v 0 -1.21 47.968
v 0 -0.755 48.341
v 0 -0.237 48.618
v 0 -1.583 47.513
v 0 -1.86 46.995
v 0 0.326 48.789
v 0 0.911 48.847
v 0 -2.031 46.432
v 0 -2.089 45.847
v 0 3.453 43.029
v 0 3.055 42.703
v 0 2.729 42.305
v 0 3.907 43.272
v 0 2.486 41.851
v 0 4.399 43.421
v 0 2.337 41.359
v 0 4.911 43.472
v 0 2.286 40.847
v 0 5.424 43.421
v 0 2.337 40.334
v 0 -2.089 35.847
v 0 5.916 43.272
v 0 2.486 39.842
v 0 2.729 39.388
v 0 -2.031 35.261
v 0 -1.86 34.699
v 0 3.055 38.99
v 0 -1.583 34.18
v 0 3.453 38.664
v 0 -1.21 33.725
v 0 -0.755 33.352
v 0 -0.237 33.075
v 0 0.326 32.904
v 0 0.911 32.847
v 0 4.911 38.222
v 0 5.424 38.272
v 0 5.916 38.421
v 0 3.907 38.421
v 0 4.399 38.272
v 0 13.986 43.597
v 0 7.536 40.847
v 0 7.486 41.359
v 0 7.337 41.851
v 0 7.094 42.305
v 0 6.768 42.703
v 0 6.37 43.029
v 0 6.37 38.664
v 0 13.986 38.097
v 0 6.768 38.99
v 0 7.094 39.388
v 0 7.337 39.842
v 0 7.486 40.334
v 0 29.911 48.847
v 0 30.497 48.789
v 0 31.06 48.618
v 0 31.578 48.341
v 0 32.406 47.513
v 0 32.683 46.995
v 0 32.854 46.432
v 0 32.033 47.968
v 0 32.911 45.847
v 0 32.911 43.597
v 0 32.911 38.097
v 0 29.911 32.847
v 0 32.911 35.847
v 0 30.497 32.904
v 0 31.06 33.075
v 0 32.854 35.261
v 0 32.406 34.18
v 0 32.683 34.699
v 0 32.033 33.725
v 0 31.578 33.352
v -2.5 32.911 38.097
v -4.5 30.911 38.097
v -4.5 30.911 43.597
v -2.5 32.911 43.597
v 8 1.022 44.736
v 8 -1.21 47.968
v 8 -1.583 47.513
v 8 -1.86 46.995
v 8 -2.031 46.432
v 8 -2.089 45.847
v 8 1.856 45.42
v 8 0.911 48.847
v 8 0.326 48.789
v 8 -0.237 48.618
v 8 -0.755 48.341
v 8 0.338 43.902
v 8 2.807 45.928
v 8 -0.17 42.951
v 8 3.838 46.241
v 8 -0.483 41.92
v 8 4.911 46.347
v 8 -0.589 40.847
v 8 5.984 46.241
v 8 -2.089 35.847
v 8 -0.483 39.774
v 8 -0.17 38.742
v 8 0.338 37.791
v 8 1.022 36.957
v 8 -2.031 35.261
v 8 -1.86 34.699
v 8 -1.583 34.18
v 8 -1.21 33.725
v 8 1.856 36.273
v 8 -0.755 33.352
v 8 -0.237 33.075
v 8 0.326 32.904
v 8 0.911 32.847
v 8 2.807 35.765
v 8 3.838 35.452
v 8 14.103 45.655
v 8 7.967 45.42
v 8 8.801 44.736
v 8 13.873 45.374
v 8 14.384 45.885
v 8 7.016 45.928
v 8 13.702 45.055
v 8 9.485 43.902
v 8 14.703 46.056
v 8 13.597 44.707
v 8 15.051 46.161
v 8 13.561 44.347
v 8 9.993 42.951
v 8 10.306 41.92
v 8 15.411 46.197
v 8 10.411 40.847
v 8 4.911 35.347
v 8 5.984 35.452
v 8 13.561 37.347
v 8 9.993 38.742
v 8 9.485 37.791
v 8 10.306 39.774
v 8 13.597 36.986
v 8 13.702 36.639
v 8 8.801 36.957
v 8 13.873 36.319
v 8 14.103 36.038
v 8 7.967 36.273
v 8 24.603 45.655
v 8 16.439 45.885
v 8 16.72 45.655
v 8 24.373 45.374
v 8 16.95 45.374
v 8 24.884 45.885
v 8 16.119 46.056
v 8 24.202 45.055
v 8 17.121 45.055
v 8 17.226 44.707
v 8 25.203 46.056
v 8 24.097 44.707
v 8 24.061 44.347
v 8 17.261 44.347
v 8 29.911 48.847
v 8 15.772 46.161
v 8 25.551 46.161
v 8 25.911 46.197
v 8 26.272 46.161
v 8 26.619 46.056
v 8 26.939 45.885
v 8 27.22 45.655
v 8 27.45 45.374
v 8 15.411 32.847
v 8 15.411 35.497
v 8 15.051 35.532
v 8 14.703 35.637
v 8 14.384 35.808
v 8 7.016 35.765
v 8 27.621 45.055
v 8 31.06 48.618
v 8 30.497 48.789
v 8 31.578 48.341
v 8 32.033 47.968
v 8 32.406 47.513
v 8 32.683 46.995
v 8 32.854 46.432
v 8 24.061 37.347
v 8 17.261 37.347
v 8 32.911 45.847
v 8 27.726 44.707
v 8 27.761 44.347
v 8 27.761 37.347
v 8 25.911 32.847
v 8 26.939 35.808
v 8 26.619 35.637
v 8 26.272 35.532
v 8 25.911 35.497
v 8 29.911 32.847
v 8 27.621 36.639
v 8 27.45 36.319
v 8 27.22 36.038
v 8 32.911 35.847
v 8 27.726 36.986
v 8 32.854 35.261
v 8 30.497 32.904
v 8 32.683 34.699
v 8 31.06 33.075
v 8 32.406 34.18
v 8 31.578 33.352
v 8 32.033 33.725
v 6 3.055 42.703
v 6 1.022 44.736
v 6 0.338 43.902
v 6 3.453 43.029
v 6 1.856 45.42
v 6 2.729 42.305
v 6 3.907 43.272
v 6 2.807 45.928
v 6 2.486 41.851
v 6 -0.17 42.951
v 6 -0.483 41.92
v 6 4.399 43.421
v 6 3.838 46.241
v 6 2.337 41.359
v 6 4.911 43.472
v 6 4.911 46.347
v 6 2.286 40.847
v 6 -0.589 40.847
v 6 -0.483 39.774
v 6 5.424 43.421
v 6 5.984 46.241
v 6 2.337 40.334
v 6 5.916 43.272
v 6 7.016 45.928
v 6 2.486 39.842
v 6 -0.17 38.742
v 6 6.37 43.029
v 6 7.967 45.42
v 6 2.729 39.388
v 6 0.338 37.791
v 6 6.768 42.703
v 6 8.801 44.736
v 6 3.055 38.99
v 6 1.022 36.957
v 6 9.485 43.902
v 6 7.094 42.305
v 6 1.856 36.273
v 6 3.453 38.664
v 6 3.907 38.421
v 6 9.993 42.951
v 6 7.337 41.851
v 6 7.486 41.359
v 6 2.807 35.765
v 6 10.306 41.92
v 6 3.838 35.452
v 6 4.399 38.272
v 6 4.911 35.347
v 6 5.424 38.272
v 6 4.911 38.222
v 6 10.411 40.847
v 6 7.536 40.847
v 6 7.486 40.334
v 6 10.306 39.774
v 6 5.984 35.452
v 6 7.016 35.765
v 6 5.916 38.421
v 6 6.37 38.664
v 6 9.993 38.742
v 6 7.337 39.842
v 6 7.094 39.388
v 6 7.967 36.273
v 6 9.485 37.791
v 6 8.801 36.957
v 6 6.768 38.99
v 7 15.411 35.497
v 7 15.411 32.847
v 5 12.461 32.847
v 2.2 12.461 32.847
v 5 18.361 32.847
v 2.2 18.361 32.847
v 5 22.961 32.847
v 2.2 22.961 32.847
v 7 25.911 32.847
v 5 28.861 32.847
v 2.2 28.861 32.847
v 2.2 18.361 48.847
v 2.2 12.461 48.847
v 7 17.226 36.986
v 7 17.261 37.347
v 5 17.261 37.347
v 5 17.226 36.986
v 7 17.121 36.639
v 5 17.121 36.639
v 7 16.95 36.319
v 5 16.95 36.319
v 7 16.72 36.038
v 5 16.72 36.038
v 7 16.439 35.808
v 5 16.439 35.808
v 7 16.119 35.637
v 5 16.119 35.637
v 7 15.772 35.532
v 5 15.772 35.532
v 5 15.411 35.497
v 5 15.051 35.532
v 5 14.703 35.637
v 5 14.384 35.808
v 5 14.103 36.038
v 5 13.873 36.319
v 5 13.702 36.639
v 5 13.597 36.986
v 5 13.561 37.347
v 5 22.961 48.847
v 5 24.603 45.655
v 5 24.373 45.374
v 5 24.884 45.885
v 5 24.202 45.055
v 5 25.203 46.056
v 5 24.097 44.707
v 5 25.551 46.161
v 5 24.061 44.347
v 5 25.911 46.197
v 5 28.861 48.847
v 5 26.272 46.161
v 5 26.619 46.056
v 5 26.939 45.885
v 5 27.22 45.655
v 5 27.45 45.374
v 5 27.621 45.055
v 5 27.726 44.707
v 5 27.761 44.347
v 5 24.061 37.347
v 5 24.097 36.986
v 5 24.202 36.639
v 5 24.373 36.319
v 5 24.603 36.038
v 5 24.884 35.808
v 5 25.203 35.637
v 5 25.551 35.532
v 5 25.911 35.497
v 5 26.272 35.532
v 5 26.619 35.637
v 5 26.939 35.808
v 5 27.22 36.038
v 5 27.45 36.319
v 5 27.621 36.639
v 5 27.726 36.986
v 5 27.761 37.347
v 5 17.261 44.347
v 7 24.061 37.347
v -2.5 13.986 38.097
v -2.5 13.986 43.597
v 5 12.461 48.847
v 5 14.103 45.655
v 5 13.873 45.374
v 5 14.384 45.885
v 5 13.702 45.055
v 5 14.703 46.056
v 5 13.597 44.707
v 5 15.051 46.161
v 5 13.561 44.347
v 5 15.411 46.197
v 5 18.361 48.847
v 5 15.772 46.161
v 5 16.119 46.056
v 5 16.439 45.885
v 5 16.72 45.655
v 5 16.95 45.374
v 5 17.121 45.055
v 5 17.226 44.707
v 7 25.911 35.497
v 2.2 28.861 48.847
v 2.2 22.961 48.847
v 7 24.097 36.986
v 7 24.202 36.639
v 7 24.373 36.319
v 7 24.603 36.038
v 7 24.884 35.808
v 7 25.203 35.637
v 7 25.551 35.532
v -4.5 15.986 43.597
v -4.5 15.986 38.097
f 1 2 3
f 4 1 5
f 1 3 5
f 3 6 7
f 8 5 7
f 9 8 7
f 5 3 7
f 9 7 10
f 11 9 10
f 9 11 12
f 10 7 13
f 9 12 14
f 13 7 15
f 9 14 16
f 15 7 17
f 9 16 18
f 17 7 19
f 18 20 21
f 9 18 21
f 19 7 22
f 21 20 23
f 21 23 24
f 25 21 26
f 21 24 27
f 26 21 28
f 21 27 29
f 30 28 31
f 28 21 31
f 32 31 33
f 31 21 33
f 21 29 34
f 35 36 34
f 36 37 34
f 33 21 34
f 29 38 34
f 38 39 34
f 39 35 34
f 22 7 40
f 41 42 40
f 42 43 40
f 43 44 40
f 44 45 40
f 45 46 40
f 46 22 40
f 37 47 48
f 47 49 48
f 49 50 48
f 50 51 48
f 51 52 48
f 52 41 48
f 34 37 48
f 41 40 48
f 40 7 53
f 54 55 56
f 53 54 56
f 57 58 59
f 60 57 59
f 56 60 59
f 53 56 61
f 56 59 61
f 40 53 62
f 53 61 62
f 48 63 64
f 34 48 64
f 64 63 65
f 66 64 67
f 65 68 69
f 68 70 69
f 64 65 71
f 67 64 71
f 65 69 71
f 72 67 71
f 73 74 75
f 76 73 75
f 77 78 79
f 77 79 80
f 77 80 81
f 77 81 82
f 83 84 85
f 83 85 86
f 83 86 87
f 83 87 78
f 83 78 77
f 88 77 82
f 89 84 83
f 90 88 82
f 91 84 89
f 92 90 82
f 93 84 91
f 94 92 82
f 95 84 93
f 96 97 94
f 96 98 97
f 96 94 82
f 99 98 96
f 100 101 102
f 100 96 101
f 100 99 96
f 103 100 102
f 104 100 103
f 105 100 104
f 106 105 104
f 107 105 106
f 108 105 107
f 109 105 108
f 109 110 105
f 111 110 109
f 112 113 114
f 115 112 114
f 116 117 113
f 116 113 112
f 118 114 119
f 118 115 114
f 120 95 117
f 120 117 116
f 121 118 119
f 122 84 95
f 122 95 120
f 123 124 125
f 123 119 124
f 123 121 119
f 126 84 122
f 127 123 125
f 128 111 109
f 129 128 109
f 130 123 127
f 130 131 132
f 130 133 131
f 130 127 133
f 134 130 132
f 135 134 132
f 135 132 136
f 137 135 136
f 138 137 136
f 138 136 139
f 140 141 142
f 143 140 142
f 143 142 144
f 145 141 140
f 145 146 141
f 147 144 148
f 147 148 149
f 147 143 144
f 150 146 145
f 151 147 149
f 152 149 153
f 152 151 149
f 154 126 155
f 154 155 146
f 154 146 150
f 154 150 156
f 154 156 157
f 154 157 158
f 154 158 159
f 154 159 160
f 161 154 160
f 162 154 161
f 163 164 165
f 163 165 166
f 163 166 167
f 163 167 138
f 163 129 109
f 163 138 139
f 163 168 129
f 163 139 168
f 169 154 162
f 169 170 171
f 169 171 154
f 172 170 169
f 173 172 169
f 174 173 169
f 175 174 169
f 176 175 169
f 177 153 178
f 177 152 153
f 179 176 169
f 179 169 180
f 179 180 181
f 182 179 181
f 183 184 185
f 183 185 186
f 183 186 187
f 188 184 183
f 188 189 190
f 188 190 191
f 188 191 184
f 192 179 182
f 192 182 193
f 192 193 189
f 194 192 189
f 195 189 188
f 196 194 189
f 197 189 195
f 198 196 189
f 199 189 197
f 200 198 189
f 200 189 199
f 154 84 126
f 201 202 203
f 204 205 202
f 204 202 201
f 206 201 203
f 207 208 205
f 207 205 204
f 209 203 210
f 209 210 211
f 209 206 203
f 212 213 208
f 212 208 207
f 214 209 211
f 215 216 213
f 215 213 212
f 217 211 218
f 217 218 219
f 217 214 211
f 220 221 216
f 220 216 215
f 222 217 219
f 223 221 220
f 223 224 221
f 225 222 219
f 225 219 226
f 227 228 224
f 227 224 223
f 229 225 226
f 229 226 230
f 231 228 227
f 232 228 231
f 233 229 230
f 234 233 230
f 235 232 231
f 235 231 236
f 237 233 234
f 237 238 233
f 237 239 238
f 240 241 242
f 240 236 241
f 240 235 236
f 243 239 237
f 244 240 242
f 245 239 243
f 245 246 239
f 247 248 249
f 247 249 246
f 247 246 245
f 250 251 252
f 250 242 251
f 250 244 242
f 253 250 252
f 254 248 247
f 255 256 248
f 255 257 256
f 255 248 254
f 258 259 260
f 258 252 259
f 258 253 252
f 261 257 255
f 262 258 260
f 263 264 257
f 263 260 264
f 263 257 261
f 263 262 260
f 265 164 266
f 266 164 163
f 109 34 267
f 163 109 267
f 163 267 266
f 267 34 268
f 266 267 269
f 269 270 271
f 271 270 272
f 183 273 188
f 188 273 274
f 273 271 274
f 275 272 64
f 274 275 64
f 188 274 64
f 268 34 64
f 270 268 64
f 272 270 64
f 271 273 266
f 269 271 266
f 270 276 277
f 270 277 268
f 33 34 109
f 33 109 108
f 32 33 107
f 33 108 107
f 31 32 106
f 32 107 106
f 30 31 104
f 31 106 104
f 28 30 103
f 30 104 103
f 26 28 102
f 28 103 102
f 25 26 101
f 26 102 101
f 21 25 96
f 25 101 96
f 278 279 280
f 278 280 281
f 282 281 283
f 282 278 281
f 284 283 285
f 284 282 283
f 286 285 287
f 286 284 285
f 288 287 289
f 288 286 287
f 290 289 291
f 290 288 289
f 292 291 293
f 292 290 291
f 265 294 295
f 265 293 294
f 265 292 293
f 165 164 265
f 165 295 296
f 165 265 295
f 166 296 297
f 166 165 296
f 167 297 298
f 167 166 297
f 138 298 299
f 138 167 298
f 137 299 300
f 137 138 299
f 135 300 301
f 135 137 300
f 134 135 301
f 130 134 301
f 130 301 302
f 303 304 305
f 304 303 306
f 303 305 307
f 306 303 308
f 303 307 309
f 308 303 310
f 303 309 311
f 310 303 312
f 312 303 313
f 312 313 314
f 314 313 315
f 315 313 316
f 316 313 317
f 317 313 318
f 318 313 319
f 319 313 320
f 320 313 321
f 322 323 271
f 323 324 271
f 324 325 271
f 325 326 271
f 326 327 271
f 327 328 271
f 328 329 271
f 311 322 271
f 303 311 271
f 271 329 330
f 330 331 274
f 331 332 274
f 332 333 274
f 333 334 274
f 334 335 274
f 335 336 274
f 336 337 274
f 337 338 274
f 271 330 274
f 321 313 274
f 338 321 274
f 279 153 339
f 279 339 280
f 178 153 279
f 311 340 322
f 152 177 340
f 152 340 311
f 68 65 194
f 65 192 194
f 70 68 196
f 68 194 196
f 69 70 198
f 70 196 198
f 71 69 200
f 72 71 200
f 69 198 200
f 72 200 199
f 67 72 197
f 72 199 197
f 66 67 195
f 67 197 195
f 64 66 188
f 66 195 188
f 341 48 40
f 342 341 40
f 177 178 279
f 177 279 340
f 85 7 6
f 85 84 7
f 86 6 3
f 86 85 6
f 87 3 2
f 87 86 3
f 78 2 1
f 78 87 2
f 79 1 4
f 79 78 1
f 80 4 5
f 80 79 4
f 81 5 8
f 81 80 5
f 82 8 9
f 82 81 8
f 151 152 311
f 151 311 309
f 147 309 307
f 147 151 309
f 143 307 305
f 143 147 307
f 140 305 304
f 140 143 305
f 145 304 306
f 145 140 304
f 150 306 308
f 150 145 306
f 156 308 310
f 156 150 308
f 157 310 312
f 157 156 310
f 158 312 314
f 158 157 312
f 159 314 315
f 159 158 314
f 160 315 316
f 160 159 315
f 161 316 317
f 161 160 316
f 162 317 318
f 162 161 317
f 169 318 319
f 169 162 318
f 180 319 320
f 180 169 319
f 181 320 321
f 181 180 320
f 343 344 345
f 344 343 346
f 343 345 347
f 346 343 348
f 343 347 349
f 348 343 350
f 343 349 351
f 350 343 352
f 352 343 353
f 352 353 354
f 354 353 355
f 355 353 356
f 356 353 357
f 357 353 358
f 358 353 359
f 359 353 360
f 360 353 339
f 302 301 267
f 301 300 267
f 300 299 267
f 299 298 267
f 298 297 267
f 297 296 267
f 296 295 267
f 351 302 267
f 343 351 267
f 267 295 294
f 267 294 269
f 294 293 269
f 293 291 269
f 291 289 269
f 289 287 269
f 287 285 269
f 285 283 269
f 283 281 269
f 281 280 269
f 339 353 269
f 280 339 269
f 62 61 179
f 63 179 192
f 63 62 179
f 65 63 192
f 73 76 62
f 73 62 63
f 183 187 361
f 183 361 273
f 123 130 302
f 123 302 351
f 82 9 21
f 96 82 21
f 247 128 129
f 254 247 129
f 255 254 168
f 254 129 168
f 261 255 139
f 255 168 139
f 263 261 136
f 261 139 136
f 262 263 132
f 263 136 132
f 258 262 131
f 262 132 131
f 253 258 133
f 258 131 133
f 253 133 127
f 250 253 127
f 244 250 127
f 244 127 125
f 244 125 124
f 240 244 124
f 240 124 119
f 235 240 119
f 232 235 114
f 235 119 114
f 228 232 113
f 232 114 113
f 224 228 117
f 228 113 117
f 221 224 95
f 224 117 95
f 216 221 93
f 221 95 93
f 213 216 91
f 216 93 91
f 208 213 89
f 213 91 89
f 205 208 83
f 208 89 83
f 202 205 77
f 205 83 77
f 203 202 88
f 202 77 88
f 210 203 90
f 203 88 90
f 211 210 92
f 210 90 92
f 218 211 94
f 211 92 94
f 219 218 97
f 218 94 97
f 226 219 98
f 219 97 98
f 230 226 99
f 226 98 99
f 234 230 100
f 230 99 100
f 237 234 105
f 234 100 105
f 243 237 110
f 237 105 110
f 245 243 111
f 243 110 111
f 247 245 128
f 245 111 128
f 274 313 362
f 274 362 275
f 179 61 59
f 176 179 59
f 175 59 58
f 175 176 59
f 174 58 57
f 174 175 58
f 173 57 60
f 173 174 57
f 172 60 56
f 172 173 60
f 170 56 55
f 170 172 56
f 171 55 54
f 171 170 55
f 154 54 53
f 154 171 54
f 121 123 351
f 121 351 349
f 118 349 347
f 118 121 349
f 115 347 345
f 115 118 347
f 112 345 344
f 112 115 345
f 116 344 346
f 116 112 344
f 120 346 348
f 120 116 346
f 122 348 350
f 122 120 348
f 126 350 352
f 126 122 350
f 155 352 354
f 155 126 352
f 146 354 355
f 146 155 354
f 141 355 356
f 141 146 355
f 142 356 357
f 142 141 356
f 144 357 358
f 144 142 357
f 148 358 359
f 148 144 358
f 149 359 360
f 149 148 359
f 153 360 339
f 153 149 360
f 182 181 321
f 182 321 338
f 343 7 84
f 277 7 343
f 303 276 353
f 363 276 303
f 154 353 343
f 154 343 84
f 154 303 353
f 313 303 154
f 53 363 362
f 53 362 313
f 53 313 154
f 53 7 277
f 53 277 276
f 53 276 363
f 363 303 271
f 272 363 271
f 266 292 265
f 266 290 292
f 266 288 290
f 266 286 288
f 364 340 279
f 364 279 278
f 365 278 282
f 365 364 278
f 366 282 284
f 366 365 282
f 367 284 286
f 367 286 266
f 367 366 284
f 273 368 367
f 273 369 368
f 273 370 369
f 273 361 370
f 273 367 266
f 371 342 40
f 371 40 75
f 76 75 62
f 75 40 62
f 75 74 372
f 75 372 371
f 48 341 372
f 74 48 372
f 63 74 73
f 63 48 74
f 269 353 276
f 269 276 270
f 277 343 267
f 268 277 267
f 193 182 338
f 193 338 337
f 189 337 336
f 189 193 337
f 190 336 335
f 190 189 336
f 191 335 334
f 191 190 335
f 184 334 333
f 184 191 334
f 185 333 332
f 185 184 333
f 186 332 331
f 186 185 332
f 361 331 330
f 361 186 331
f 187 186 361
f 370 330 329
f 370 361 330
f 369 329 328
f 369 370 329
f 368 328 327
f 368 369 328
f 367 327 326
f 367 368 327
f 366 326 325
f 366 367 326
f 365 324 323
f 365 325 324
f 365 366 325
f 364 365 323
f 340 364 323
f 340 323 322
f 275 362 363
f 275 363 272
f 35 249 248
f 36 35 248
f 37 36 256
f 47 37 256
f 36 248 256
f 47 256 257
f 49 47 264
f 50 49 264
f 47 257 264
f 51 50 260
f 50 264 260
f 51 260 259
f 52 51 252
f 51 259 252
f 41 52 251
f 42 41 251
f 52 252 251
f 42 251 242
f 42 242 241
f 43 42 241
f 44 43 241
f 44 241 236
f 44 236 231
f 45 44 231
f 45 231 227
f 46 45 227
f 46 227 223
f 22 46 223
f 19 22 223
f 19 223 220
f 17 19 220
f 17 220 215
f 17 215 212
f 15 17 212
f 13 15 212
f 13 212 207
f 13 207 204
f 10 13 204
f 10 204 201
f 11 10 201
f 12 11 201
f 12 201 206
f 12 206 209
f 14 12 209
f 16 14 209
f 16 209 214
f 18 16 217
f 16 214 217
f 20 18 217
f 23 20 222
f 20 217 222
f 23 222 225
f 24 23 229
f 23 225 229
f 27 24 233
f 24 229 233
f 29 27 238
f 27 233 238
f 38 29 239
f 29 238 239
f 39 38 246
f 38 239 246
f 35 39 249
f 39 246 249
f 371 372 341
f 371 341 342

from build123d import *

# Parameters (mm, degrees)
SKETCH1_W           = 16
SKETCH1_H           = 35
BOSS_EXTRUDE1_DEPTH = 8
SKETCH2_W           = 5.5
SKETCH2_H           = 18.925407089
BOSS_EXTRUDE2_DEPTH = 4.5
CHAMFER1_SIZE       = 2
CUT_EXTRUDE1_START  = -3
SKETCH7_W           = 16
SKETCH7_H           = 5.9
CUT_EXTRUDE1_DEPTH  = 2.8
CUT_EXTRUDE2_DEPTH  = 5
SKETCH9_W           = 4.5
SKETCH9_H           = 10.5
CUT_EXTRUDE3_DEPTH  = 1
FILLET7_R           = 3
SKETCH10_R          = 2.625
CUT_EXTRUDE4_DEPTH  = 20
SKETCH11_R          = 5.5
CUT_EXTRUDE5_DEPTH  = 2


with BuildPart() as part:
    # Sketch1 → Boss-Extrude1 (new body)
    with BuildSketch(Plane(origin=(0, 0, 0), x_dir=(0, 0, -1), z_dir=(1, 0, 0))):
        with Locations((-40.846556001, 15.41146402)):
            Rectangle(SKETCH1_W, SKETCH1_H)
    extrude(amount=BOSS_EXTRUDE1_DEPTH)

    # Sketch2 → Boss-Extrude2 (add)
    with BuildSketch(Plane.ZY):
        with Locations((40.846556001, 23.448760476)):
            Rectangle(SKETCH2_W, SKETCH2_H)
    extrude(amount=BOSS_EXTRUDE2_DEPTH)

    # Chamfer1
    chamfer1_edges = [part.edges().sort_by_distance(p)[0] for p in [
        (-4.5, 13.986056931, 40.846556001),
        (-4.5, 32.91146402, 40.846556001),
    ]]
    chamfer(chamfer1_edges, length=CHAMFER1_SIZE)

    # Sketch7 → Cut-Extrude1 (cut)
    with BuildSketch(Plane(origin=(8, 0, 0), x_dir=(0, 0, -1), z_dir=(1, 0, 0)).offset(CUT_EXTRUDE1_START)):
        with Locations((-40.846556001, 25.91146402)):
            Rectangle(SKETCH7_W, SKETCH7_H)
        with Locations((-40.846556001, 15.41146402)):
            Rectangle(SKETCH7_W, SKETCH7_H)
    extrude(amount=-CUT_EXTRUDE1_DEPTH, mode=Mode.SUBTRACT)

    # Sketch8 → Cut-Extrude2 (cut)
    with BuildSketch(Plane(origin=(8, 0, 0), x_dir=(0, 0, -1), z_dir=(1, 0, 0))):
        with BuildLine():
            Line((-44.346556001, 27.76146402), (-37.346556001, 27.76146402))
            ThreePointArc((-37.346556001, 27.76146402), (-35.496556001, 25.91146402), (-37.346556001, 24.06146402))
            Line((-37.346556001, 24.06146402), (-44.346556001, 24.06146402))
            ThreePointArc((-44.346556001, 24.06146402), (-46.196556001, 25.91146402), (-44.346556001, 27.76146402))
        make_face()
        with BuildLine():
            Line((-44.346556001, 17.26146402), (-37.346556001, 17.26146402))
            ThreePointArc((-37.346556001, 17.26146402), (-35.496556001, 15.41146402), (-37.346556001, 13.56146402))
            Line((-37.346556001, 13.56146402), (-44.346556001, 13.56146402))
            ThreePointArc((-44.346556001, 13.56146402), (-46.196556001, 15.41146402), (-44.346556001, 17.26146402))
        make_face()
    extrude(amount=-CUT_EXTRUDE2_DEPTH, mode=Mode.SUBTRACT)

    # Sketch9 → Cut-Extrude3 (cut)
    with BuildSketch(Plane(origin=(8, 0, 0), x_dir=(0, 0, -1), z_dir=(1, 0, 0))):
        with Locations((-35.096556001, 20.66146402)):
            Rectangle(SKETCH9_W, SKETCH9_H)
    extrude(amount=-CUT_EXTRUDE3_DEPTH, mode=Mode.SUBTRACT)

    # Fillet7
    fillet7_edges = [part.edges().sort_by_distance(p)[0] for p in [
        (4, 32.91146402, 32.846556001),
        (4, 32.91146402, 48.846556001),
        (4, -2.08853598, 48.846556001),
        (4, -2.08853598, 32.846556001),
    ]]
    fillet(fillet7_edges, radius=FILLET7_R)

    # Sketch10 → Cut-Extrude4 (cut)
    with BuildSketch(Plane(origin=(8, 0, 0), x_dir=(0, 0, -1), z_dir=(1, 0, 0))):
        with Locations((-40.846556001, 4.91146402)):
            Circle(SKETCH10_R)
    extrude(amount=-CUT_EXTRUDE4_DEPTH, mode=Mode.SUBTRACT)

    # Sketch11 → Cut-Extrude5 (cut)
    with BuildSketch(Plane(origin=(8, 0, 0), x_dir=(0, 0, -1), z_dir=(1, 0, 0))):
        with Locations((-40.846556001, 4.91146402)):
            Circle(SKETCH11_R)
    extrude(amount=-CUT_EXTRUDE5_DEPTH, mode=Mode.SUBTRACT)


solid = part.part
